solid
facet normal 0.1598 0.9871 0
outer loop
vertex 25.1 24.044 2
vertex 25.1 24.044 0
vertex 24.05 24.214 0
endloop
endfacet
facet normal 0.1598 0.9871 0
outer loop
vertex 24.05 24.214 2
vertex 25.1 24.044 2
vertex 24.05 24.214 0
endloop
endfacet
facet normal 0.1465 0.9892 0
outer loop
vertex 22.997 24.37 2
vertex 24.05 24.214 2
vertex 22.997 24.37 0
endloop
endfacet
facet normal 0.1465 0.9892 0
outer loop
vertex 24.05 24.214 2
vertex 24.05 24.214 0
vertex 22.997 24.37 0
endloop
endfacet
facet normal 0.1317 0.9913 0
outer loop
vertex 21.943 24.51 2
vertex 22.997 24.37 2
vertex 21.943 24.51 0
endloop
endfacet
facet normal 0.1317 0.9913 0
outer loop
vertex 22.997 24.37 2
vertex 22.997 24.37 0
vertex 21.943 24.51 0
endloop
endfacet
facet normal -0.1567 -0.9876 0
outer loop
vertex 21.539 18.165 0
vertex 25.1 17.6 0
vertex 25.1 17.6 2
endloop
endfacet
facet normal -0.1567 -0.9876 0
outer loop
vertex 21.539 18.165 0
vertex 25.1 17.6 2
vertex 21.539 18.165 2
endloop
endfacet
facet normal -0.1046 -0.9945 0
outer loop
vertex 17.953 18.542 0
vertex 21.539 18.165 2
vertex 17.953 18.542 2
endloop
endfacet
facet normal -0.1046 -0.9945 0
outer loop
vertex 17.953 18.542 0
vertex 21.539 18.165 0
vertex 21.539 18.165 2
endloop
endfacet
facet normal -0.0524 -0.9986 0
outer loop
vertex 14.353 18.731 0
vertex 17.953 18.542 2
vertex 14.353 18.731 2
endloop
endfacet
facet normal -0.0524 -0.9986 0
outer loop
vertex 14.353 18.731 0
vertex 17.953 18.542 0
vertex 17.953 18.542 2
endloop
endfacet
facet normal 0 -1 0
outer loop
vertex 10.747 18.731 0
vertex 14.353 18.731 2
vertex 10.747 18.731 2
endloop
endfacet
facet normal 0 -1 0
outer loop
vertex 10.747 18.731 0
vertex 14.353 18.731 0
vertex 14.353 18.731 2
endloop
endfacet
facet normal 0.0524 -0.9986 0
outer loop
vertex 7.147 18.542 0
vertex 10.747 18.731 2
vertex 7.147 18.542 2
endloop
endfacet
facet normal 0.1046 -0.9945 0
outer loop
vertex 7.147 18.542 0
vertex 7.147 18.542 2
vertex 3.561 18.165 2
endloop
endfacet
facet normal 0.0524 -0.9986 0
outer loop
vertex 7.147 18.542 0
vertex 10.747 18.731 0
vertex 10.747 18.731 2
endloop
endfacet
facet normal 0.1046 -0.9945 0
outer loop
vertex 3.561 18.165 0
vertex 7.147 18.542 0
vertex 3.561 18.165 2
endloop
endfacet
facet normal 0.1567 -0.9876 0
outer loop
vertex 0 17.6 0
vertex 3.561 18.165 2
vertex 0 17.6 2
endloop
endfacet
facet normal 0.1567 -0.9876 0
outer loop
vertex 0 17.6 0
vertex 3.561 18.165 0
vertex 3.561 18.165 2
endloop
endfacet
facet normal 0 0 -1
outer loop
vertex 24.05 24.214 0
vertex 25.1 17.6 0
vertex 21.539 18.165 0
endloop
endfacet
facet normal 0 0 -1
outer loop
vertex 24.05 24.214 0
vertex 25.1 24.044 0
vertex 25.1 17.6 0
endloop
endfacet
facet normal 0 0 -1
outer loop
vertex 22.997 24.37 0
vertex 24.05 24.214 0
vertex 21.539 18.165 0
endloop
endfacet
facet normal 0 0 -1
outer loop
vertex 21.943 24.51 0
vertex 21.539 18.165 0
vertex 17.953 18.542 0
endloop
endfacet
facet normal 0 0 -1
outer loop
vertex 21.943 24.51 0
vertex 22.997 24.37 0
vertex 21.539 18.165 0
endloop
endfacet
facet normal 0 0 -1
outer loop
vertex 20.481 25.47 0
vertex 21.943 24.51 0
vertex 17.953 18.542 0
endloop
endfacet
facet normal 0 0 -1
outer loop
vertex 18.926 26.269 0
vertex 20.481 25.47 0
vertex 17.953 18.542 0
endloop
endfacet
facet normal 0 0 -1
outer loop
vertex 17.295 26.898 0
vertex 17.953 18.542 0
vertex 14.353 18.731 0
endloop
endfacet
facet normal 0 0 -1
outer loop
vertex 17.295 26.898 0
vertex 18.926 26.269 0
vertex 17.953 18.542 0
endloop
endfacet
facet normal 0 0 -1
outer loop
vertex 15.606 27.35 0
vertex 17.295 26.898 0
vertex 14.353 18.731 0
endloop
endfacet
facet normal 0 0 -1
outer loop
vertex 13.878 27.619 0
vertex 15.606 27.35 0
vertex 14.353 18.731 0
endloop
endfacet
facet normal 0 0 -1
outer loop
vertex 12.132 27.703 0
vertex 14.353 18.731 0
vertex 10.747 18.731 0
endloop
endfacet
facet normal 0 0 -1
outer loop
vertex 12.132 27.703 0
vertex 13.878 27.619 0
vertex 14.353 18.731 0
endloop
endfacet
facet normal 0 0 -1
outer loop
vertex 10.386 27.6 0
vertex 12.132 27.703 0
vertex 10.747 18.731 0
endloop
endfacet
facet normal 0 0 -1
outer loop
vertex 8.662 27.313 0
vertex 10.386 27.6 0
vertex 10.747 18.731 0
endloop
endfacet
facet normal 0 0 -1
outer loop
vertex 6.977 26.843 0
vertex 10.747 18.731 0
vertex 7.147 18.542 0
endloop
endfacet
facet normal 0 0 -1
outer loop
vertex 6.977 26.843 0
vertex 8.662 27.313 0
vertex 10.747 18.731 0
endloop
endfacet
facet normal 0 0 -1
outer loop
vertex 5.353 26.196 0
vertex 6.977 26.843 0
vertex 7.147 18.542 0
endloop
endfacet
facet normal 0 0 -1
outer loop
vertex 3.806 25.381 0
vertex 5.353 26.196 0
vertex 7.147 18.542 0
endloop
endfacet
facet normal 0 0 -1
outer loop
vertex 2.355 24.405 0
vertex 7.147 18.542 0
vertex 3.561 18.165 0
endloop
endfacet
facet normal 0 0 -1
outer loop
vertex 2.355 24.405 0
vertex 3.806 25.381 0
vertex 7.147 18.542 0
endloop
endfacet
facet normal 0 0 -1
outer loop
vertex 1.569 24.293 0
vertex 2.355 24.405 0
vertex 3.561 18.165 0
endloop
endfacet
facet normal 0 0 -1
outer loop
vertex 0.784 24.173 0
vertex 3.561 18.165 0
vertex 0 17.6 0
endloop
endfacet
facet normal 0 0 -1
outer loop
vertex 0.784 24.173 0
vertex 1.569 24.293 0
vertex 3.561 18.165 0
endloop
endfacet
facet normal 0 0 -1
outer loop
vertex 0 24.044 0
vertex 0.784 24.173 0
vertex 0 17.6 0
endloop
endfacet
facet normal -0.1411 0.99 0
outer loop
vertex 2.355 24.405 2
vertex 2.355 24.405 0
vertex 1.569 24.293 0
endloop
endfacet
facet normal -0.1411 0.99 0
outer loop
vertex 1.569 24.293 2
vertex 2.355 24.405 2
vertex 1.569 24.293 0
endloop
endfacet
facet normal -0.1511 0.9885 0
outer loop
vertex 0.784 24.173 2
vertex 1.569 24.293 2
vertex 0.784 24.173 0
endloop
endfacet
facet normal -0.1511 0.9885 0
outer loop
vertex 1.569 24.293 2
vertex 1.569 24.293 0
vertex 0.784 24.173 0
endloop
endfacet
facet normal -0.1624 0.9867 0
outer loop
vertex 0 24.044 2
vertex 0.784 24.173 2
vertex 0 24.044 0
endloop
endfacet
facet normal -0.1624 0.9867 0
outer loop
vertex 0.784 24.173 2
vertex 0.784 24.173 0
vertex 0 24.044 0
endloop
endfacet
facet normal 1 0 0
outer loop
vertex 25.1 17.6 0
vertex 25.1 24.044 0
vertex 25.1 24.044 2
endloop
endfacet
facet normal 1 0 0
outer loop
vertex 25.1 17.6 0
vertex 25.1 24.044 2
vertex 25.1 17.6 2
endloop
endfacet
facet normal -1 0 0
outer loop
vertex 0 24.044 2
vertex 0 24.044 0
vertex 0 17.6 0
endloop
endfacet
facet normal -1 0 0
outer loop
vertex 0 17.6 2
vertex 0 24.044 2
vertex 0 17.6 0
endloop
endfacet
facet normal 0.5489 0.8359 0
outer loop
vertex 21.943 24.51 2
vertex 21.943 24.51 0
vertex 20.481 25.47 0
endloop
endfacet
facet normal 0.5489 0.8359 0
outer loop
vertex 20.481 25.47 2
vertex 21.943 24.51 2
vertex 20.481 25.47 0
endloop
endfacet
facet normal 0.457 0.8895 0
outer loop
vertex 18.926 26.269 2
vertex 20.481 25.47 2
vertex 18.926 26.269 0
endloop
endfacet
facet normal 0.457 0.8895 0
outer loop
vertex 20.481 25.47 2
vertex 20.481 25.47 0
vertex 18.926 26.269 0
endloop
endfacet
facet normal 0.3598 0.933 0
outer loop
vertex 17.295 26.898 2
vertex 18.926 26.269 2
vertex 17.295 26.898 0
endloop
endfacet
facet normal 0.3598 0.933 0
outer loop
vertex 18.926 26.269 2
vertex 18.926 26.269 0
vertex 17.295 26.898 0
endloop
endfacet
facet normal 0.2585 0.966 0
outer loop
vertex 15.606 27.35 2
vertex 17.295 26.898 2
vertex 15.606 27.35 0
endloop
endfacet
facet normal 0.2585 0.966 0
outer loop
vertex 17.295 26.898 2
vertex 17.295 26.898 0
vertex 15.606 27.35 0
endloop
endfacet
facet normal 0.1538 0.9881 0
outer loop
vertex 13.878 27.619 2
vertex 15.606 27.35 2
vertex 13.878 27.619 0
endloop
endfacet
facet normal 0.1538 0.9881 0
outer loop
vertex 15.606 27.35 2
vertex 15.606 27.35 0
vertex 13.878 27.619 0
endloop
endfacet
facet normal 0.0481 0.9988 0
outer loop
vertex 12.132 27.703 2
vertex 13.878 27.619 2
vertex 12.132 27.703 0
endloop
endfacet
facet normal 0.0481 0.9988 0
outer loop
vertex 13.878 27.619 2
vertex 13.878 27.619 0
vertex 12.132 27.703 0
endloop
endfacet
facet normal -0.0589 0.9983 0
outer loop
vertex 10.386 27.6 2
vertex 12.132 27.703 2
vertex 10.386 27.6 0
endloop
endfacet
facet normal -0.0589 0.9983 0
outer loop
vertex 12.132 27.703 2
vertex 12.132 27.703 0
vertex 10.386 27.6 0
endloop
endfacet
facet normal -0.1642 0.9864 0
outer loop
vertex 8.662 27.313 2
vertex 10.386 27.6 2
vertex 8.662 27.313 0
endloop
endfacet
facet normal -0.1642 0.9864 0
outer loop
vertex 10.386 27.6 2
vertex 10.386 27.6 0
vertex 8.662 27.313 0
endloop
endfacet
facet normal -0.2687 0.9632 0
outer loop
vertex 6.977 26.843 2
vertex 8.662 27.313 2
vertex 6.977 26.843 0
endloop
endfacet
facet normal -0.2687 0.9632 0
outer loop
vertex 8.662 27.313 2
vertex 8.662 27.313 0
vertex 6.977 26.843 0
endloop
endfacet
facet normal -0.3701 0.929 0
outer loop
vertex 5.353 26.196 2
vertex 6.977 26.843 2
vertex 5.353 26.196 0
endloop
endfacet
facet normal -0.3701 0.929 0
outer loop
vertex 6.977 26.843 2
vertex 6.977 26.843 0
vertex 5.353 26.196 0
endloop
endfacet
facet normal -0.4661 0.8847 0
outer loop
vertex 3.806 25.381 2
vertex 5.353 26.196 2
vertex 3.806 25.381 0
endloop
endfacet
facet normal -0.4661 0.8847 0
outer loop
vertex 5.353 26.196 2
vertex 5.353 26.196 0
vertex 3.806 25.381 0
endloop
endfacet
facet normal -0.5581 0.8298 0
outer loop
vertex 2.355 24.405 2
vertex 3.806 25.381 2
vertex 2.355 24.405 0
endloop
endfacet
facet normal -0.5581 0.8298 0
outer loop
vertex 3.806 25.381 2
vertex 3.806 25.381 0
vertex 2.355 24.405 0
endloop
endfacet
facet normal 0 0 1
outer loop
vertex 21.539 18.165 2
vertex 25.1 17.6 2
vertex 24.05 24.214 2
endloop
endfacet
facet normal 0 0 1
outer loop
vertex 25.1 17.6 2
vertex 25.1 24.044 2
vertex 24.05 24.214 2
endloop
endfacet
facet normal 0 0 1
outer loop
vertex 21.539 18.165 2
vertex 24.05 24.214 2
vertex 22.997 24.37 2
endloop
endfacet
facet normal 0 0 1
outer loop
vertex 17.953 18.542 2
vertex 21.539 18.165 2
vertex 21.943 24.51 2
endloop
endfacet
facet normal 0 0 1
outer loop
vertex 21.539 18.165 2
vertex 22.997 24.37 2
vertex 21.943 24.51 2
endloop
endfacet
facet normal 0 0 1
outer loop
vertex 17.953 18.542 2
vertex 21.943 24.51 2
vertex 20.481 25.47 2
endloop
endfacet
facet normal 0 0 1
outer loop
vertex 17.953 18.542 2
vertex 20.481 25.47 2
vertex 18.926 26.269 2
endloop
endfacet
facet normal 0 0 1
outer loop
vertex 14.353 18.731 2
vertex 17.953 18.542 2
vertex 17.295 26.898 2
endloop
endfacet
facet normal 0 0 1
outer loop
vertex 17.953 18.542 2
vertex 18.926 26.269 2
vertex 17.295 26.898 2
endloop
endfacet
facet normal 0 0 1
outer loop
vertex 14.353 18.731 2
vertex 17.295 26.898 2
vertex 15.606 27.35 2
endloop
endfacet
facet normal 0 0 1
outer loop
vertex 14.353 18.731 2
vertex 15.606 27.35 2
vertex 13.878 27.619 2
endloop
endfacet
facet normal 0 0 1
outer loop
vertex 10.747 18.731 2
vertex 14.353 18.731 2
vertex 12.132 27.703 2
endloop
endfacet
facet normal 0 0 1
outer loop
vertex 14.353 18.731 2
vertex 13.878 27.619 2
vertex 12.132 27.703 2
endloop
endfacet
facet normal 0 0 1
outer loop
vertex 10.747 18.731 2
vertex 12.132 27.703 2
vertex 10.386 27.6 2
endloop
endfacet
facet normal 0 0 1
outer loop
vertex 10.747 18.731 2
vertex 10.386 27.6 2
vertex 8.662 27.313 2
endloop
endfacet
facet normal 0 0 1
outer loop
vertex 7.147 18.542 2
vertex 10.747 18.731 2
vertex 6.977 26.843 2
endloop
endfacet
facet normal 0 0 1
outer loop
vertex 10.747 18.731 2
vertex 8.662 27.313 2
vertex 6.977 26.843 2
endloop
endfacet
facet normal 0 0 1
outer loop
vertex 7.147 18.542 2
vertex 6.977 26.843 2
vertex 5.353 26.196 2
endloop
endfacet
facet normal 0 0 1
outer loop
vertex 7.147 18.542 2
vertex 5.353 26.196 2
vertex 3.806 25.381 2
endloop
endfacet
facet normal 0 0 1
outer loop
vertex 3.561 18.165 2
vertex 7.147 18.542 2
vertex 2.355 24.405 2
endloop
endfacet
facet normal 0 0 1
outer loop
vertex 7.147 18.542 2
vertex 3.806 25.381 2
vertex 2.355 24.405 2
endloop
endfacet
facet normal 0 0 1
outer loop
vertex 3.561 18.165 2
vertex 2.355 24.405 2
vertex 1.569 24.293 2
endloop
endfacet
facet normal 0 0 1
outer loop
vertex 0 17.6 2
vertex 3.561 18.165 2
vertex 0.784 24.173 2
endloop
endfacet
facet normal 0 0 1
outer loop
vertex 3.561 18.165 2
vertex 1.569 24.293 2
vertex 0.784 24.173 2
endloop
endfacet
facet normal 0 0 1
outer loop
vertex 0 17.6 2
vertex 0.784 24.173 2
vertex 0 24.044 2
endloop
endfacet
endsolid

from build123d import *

# Parameters (mm, degrees)
PAD_DEPTH = 2


with BuildPart() as part:
    # Sketch → Pad (new body)
    with BuildSketch(Plane.XY):
        with BuildLine():
            ThreePointArc((25.1, 17.6), (12.55, 18.755091), (0, 17.6))
            Line((0, 24.043957), (0, 17.6))
            ThreePointArc((2.355405, 24.40484), (1.176271, 24.233741), (0, 24.043957))
            ThreePointArc((21.942711, 24.510315), (12.131582, 27.703085), (2.355405, 24.40484))
            ThreePointArc((25.1, 24.043957), (23.523833, 24.293909), (21.942711, 24.510315))
            Line((25.1, 24.043957), (25.1, 17.6))
        make_face()
    extrude(amount=PAD_DEPTH)


solid = part.part
